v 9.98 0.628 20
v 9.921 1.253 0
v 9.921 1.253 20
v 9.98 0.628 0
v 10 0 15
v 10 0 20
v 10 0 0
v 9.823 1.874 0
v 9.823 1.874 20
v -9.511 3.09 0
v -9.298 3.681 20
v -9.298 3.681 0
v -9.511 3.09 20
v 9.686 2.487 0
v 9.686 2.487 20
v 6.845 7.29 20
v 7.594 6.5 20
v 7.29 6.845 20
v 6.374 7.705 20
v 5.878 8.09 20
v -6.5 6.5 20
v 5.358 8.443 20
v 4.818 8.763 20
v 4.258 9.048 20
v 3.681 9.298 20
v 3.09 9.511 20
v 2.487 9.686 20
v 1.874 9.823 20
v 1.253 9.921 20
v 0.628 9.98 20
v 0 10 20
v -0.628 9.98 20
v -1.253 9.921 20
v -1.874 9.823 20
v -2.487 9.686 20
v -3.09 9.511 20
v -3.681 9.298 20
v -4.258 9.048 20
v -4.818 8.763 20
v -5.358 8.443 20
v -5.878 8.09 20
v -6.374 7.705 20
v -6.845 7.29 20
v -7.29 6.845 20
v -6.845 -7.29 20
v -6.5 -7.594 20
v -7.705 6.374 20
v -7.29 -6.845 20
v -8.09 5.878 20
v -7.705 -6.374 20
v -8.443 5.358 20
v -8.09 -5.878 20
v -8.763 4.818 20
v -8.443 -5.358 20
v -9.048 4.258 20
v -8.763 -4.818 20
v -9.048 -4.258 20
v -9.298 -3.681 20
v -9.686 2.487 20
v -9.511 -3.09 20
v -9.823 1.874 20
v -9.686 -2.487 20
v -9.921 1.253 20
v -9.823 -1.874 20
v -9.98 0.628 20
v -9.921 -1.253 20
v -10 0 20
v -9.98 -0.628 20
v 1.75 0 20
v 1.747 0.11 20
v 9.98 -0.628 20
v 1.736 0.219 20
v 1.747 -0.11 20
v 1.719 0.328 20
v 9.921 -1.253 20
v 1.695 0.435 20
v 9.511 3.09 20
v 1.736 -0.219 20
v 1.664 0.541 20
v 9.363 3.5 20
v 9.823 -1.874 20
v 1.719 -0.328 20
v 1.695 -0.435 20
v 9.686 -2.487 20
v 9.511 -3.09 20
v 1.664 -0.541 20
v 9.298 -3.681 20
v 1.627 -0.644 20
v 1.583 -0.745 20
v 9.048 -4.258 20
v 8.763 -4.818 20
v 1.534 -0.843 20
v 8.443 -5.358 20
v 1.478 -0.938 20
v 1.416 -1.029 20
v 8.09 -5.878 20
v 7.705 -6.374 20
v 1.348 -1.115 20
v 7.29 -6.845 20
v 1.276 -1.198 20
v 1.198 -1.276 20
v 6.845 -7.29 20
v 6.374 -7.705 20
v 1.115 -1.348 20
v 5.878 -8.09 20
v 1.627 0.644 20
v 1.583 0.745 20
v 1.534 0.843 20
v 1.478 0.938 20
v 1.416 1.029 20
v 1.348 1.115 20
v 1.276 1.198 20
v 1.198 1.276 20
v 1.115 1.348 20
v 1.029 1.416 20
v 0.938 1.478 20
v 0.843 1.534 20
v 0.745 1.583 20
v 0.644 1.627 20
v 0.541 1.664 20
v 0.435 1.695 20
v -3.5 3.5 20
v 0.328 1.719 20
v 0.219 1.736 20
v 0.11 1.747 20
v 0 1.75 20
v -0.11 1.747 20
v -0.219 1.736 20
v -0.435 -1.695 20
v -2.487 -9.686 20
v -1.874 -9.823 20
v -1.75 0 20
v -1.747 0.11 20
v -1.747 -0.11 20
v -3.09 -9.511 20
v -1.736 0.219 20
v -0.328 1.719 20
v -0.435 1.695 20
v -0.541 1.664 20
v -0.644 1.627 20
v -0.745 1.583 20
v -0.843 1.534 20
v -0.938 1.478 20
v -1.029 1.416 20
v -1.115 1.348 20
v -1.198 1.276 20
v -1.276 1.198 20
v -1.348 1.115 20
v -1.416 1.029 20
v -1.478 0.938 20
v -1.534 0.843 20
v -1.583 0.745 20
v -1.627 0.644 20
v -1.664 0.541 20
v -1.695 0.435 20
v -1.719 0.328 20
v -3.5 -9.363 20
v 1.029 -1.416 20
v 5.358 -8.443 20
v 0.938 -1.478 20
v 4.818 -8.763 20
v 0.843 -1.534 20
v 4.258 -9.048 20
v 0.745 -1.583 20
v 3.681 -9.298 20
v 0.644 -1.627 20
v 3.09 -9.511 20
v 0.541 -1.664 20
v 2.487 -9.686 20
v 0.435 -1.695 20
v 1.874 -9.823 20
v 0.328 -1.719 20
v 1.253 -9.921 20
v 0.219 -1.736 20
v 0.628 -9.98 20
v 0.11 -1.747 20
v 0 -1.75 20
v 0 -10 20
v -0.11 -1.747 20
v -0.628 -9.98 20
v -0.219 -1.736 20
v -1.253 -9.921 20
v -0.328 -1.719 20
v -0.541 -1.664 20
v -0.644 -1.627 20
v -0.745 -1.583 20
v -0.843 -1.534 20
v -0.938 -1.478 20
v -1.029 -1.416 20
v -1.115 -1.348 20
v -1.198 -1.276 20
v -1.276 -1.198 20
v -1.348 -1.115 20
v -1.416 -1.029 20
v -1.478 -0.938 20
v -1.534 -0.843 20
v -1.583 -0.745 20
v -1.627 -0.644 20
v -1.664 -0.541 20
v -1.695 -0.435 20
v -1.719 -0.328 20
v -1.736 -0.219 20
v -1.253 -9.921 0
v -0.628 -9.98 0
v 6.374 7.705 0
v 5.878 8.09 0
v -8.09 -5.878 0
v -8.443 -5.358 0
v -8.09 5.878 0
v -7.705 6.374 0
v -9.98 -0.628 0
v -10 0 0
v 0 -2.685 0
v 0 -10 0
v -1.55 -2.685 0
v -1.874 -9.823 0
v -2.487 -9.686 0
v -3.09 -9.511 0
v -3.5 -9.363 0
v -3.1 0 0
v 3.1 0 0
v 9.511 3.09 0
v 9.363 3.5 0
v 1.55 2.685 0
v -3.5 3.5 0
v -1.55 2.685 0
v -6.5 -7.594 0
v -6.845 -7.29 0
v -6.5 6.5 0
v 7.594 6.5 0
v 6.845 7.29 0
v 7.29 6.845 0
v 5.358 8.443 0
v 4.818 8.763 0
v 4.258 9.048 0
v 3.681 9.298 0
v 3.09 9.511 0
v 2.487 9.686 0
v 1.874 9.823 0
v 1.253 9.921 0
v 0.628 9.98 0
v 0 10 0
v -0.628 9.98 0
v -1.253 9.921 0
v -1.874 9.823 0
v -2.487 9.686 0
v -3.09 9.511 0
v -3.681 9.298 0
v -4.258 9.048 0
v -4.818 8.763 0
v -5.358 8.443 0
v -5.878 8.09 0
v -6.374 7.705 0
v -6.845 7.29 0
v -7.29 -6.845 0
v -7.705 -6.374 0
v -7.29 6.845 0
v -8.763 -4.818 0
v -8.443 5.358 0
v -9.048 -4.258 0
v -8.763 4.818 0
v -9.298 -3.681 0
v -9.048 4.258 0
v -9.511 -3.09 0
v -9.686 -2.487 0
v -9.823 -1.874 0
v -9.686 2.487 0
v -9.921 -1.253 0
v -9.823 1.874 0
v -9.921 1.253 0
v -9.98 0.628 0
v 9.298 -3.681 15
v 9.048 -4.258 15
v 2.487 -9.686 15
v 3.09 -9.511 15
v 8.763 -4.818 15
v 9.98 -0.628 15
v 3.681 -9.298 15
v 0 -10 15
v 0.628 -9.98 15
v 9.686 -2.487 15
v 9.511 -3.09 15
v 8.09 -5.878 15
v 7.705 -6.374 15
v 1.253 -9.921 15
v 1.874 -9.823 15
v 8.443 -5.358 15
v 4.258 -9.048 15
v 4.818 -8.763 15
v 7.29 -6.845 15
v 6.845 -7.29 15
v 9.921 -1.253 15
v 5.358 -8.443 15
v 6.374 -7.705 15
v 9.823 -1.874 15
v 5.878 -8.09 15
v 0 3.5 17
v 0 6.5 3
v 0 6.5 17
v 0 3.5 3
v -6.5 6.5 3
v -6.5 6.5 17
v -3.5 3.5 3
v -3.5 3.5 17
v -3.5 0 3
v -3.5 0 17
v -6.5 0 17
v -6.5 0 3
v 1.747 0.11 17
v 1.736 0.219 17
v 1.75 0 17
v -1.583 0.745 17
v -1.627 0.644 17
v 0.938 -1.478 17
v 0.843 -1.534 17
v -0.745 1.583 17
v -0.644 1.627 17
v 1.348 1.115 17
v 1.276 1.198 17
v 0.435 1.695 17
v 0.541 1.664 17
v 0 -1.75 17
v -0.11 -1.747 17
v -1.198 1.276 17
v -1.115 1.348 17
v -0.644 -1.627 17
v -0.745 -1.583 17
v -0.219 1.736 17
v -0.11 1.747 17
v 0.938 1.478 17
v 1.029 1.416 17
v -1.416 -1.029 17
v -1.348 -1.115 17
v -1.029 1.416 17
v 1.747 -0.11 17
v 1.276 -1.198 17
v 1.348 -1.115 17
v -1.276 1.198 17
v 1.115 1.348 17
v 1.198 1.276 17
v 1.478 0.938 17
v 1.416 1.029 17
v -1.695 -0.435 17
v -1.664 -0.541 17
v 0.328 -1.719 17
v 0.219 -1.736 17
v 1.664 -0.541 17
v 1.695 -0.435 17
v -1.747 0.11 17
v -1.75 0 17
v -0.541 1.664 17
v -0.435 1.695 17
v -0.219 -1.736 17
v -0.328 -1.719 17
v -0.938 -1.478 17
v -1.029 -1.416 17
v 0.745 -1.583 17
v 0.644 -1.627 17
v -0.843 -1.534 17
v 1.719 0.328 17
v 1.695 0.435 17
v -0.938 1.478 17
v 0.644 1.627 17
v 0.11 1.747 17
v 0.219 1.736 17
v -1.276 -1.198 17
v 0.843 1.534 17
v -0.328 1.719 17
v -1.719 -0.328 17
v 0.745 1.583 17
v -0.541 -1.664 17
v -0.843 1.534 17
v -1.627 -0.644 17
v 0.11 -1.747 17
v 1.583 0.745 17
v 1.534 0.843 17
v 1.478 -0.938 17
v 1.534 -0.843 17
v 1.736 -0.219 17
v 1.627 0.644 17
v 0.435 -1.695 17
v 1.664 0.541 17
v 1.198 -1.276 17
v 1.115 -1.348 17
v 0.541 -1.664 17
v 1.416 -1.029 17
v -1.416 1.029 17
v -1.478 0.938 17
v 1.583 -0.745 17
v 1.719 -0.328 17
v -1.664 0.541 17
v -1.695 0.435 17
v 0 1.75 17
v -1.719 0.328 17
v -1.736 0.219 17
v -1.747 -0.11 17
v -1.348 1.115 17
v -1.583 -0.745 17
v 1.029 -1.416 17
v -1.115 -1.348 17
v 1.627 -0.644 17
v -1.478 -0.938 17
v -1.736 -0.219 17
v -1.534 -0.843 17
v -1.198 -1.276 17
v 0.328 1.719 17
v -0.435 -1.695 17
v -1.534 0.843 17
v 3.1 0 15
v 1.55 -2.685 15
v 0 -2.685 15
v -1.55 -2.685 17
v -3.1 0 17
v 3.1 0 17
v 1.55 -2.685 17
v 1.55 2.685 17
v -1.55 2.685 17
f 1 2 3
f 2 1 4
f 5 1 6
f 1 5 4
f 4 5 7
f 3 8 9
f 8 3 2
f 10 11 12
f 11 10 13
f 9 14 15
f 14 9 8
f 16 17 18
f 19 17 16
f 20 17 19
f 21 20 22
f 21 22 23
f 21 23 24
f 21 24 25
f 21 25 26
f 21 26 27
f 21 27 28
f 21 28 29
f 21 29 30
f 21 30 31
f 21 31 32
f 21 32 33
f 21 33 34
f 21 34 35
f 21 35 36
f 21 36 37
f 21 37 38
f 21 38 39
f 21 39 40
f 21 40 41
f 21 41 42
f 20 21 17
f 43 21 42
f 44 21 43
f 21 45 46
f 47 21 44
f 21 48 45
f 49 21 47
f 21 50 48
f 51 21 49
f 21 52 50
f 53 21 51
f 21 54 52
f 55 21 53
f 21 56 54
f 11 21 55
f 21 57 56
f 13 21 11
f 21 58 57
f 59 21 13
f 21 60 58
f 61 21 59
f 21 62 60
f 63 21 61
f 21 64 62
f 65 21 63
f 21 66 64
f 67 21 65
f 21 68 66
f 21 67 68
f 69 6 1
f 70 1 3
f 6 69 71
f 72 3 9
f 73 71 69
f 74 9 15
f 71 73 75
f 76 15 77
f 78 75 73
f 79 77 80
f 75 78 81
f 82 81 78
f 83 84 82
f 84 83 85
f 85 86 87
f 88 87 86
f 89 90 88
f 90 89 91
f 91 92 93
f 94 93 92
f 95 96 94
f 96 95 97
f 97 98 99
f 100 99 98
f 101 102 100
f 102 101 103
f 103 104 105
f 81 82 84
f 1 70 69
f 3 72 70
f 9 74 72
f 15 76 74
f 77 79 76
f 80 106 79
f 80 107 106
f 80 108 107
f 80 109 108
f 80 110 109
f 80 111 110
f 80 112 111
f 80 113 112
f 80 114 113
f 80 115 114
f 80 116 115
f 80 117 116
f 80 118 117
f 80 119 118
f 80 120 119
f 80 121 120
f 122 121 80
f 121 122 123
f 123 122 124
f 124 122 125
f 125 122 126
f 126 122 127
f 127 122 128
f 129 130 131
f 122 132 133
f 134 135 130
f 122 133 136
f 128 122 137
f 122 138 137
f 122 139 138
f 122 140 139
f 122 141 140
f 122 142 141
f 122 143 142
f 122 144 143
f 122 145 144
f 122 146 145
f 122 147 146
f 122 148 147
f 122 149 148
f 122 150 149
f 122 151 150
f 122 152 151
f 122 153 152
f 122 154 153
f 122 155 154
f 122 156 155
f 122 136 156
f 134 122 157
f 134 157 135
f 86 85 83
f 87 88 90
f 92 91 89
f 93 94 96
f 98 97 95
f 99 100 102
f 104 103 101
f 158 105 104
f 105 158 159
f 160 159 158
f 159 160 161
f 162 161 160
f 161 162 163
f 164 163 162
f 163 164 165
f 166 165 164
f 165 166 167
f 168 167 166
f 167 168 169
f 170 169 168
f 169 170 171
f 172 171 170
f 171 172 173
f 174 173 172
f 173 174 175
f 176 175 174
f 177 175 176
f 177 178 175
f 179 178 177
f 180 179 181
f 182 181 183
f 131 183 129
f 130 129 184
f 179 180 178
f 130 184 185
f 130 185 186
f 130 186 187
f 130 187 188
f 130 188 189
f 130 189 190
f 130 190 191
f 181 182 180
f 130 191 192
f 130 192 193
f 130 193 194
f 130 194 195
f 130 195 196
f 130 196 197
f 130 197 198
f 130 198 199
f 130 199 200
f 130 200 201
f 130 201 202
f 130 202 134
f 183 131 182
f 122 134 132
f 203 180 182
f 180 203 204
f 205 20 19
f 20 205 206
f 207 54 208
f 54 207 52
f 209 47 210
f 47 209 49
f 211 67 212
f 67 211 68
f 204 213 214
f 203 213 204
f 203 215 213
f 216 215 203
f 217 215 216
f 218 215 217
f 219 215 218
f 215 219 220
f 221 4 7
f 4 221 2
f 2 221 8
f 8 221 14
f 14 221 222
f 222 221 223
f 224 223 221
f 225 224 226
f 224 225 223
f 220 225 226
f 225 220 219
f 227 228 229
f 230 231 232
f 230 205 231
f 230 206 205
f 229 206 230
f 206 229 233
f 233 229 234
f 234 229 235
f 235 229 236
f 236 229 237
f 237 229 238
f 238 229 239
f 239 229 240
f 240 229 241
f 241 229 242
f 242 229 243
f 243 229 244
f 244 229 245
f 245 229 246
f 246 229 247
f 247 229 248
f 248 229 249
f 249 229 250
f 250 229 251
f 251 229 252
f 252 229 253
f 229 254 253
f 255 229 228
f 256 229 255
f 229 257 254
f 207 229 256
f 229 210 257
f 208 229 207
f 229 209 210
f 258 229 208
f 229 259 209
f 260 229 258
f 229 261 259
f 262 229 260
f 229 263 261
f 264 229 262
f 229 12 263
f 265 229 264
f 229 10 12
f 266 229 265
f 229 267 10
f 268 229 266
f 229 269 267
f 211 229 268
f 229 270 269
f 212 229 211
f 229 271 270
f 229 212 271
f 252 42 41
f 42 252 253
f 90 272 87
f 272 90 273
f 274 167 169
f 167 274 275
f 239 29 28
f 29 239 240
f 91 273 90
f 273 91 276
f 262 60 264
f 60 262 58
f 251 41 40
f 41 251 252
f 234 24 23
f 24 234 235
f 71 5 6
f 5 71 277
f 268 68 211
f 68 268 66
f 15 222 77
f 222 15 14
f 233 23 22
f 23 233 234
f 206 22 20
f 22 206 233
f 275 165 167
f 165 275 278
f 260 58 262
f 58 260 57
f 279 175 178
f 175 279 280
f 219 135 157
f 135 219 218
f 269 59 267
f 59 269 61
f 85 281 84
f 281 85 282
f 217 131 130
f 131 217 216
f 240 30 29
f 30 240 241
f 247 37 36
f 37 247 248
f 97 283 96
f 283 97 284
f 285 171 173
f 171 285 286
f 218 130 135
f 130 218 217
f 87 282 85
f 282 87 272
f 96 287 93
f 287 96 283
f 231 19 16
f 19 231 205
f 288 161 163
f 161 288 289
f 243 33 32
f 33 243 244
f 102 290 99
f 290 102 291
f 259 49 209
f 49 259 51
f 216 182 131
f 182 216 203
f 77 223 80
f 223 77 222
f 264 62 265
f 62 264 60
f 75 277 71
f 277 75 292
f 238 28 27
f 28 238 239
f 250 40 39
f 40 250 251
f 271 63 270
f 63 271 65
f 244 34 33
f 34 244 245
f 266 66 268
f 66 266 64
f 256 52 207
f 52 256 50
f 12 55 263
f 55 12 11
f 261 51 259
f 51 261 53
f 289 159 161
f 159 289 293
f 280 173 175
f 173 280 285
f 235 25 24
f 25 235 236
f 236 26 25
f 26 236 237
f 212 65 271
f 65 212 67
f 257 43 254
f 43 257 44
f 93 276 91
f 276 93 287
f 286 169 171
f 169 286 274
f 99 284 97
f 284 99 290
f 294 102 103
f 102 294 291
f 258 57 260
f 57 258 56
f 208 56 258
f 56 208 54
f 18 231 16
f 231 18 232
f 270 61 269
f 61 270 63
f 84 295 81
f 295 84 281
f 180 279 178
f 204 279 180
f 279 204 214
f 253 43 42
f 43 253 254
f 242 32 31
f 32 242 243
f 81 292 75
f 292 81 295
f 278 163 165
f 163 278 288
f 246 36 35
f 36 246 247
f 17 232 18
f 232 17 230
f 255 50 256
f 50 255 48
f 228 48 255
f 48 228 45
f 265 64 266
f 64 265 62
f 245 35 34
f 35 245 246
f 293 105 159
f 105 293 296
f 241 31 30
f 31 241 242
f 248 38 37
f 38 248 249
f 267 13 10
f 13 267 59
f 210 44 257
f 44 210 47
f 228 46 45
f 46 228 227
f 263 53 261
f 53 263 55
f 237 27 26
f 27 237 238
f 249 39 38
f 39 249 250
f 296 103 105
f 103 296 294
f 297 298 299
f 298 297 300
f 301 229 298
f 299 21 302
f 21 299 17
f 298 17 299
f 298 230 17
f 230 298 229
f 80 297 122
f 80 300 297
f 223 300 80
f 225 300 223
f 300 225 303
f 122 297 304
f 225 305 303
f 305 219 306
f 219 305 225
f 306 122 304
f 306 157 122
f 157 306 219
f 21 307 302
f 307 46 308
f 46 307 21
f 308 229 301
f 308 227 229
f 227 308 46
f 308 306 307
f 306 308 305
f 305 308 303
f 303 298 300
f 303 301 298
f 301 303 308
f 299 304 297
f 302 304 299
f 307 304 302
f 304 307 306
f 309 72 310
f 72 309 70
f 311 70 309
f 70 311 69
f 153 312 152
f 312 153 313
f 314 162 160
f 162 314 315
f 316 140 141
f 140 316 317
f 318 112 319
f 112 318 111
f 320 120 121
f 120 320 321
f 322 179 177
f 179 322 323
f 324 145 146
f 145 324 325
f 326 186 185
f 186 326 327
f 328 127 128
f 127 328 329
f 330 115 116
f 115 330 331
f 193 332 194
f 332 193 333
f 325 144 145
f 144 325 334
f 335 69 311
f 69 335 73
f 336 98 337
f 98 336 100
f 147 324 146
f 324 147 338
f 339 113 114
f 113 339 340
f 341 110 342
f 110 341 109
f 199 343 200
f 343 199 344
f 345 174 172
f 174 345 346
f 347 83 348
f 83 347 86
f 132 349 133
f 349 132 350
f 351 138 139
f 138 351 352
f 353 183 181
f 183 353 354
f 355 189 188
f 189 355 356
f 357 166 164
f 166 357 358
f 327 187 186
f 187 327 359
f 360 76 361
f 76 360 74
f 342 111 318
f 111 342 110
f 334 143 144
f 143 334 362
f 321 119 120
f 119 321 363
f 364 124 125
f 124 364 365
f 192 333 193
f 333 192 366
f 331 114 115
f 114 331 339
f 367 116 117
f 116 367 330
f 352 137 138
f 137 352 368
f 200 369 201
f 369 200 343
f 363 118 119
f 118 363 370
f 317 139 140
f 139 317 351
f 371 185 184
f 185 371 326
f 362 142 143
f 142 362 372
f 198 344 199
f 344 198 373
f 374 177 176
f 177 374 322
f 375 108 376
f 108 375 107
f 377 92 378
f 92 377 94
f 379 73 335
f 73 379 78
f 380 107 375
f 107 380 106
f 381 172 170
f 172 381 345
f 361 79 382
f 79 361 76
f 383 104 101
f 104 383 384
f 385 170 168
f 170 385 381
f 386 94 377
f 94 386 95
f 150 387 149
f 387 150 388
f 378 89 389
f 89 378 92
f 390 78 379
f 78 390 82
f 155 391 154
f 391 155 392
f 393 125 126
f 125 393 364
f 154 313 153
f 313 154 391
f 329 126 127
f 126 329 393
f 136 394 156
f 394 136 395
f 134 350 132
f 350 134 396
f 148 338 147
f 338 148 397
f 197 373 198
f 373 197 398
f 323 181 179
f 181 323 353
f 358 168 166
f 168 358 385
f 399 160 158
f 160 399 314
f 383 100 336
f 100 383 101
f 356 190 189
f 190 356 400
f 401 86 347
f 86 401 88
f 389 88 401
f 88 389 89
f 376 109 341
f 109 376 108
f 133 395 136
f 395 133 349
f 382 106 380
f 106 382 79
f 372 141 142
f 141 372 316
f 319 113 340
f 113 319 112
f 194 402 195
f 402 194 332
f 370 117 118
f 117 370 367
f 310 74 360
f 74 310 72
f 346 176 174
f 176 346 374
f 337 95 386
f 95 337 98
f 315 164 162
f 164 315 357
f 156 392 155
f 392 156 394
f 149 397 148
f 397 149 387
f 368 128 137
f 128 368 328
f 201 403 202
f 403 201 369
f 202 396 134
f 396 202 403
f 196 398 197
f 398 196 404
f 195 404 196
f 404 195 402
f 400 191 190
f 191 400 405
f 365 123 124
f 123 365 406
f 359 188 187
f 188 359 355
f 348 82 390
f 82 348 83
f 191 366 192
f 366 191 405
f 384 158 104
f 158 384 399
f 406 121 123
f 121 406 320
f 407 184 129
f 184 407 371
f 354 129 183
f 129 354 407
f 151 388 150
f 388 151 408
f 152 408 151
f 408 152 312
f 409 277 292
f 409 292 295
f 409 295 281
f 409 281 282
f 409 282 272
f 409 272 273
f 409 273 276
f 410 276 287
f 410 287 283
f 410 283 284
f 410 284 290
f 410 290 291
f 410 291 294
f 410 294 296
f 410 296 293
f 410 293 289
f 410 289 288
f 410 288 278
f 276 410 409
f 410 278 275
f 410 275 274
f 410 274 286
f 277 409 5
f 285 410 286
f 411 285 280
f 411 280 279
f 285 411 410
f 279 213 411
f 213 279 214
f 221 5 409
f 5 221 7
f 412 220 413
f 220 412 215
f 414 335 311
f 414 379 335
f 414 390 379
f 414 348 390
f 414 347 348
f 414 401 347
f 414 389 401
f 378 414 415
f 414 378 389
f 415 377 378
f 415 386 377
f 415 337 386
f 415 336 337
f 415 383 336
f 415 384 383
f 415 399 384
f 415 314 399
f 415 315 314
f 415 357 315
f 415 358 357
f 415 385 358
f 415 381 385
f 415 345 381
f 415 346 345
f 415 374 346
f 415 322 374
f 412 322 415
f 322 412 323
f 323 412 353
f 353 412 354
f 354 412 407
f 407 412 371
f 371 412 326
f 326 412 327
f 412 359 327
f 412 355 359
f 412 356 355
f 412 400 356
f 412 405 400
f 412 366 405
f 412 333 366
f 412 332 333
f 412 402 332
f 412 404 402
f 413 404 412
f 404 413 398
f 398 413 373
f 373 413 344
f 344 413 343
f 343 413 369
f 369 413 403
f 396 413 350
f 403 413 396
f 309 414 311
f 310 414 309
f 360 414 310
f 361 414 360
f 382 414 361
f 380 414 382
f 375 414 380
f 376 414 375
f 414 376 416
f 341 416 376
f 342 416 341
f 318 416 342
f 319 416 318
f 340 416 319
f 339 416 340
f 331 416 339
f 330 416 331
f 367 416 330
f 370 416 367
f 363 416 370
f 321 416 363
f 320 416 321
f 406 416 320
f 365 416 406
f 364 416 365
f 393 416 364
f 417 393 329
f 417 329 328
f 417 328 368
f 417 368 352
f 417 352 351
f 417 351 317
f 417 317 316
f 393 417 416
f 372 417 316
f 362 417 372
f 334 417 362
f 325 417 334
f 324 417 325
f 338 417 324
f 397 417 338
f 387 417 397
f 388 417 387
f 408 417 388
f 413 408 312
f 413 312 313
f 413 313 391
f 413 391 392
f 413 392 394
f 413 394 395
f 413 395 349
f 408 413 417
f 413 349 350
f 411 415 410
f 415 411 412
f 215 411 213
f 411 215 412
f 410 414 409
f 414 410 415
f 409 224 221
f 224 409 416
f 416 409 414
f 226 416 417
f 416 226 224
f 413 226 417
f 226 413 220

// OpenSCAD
// file: lada.scad
$fn=100;

mm = 1;
inch = 25.4 * mm;

LENGTH = .75 * inch;
EDGE_WIDTH = .5 * inch;
THICKNESS = .2 * inch;

MATERIAL_THICKNESS = 3 * mm;
OFFSET = .4 * inch;

HEX_R = 6.2 * mm / 2;
HEX_r = 5.6 * mm / 2;
HEX_THICKNESS = 2.3 * mm; 

PCB_L = 5 * inch;
PCB_W = 5 * inch;
PCB_H = 2 * mm;

//HEX_THICKNESS = 1.5 * mm; // for thin version
//THICKNESS = 3 * mm; // for thin version

SCREW_R = 1.6 * mm;
module hex(){
  linear_extrude(height=HEX_THICKNESS * 2, center=false) circle(r=HEX_R, $fn=6);
}
module hex_old(){
  difference(){
    cylinder(r=HEX_R, h=HEX_THICKNESS);
    for(i=[0, 1, 2, 3, 4, 5]){
      rotate(a=60 * i, v=[0, 0, 1])
	translate([HEX_r, -5, 5])rotate(a=90, v=[0, 1, 0])cube([10, 10, HEX_THICKNESS]);
    }
  }
}

TAB_HEIGHT = .5*mm;
TAB_R = 5*mm;
// tab to prevent rollup
module tab(x, y){
  translate([x, y])cylinder(r=TAB_R, h=TAB_HEIGHT);
}

module edge(length, thickness, offset){
  LENGTH = length;
  THICKNESS = thickness;
  OFFSET = offset;
  difference(){
    union(){
      difference(){
	cube([OFFSET, EDGE_WIDTH, OFFSET]);
	translate([THICKNESS, -.01 * EDGE_WIDTH/2, THICKNESS])scale([1, 1.01, 1])cube([LENGTH, EDGE_WIDTH, LENGTH]);
      }
      union(){
	translate([OFFSET, EDGE_WIDTH/2, 0])cylinder(r=EDGE_WIDTH / 2, h=THICKNESS);
	translate([0, EDGE_WIDTH/2, OFFSET])rotate(v=[0, 1, 0], a=90)cylinder(r=EDGE_WIDTH / 2, h=THICKNESS);
      }
    }
    translate([OFFSET, EDGE_WIDTH/2, 0])cylinder(r=SCREW_R, h=THICKNESS * 1.1);
    translate([-.01, EDGE_WIDTH/2, OFFSET])rotate(v=[0, 1, 0], a=90)cylinder(r=SCREW_R, h=THICKNESS * 10);
  }
}

module pcb(){
  cube([PCB_L, PCB_W, PCB_H]);
}

module inside_edge(length, thickness, offset){
  LENGTH = length;
  THICKNESS = thickness;
  OFFSET = offset;
  difference(){
    edge(length, thickness, offset);
    //translate([.2 * inch - 1*mm, EDGE_WIDTH/2 + PCB_H/2, .2 * inch - 1*mm])rotate(v=[-1, 0, 0], a=-90)translate([THICKNESS * 3/4, -1, THICKNESS])pcb();
    translate([OFFSET, EDGE_WIDTH/2, THICKNESS - HEX_THICKNESS])scale([1, 1, 1.01])hex();
    translate([THICKNESS - HEX_THICKNESS, EDGE_WIDTH/2, OFFSET])rotate(v=[0, 1, 0], a=90)scale([1, 1, 1.01])hex();
  }
}
module outside_edge(length, thickness, offset){
  difference(){
    edge(length, thickness, offset);
    translate([OFFSET, EDGE_WIDTH/2, 0])scale([1, 1, 1.01])cylinder(r=HEX_R * 1.1, h=HEX_THICKNESS);
    translate([0, EDGE_WIDTH/2, OFFSET])scale([1, 1, 1.01])rotate(v=[0, 1, 0], a=90)cylinder(r=HEX_R * 1.1, h=HEX_THICKNESS);
  }
}

module corner(length, thickness, offset){
  echo("offset", offset);
  LENGTH = length;
  THICKNESS = thickness;
  OFFSET = offset;
  union(){
    //tab(0, 0);
    //tab(LENGTH, 0);
    //tab(0, LENGTH);

    intersection(){
      difference(){
	cube(LENGTH);
	translate([THICKNESS, THICKNESS, THICKNESS])
	  cube(LENGTH);
	translate([OFFSET, OFFSET, 0])
	  translate([0, 0, -1])
	  cylinder(r=SCREW_R, h=2 * THICKNESS);
	translate([OFFSET, 0, OFFSET])
	  rotate(v=[-1, 0, 0], a=90) 
	  translate([0, 0, -1])
	  cylinder(r=SCREW_R, h=2 * THICKNESS);
	translate([0, OFFSET, OFFSET])
	  rotate(v=[0, 1, 0], a=90)
	  translate([0, 0, -1])
	  cylinder(r=SCREW_R, h=2 * THICKNESS);
      }
      
      union(){
	rotate(v=[0, 0, -1], a=0)cylinder(r=LENGTH*1.04, h=THICKNESS);
	rotate(v=[-1,0, 0], a=90)cylinder(r=LENGTH*1.04, h=THICKNESS);
	rotate(v=[0, 1, 0], a=90)cylinder(r=LENGTH*1.04 , h=THICKNESS);
      }
      // sphere(r=LENGTH);
    }
  }
}

module inside_corner(length, thickness, offset, standoff_h=10*mm){
  LENGTH = length;
  THICKNESS = thickness;
  OFFSET = offset;

  // translate([THICKNESS, THICKNESS, THICKNESS])cube(standoff_h*mm);
  difference(){
    corner(LENGTH, THICKNESS, OFFSET);
    translate([OFFSET, OFFSET, THICKNESS - HEX_THICKNESS])scale([1, 1, 100])hex();
    translate([OFFSET, THICKNESS - HEX_THICKNESS,  OFFSET])
      rotate(v=[-1, 0, 0], a=90)
      scale([1, 1, 100])
      hex();
    translate([THICKNESS - HEX_THICKNESS, OFFSET,  OFFSET])
      rotate(v=[1, 0, 0], a=30) // correct one!
      rotate(v=[0, 1, 0], a=90) // correct one!
      scale([1, 1, 100]) hex();
    // translate([THICKNESS * 2/4, THICKNESS * 2/4, THICKNESS + standoff_h])pcb();
  }
}
module outside_corner(length, thickness, offset, material_thickness){
  LENGTH = length + (material_thickness + thickness) * sqrt(2);
  THICKNESS = thickness;
  OFFSET = offset + material_thickness + thickness;
  echo("OFFSET", OFFSET);
  difference(){
    union(){
      corner(LENGTH, THICKNESS, OFFSET);
    }

    // counter bore
    translate([OFFSET,  HEX_THICKNESS, OFFSET])
      rotate(v=[1, 0, 0], a=90)
      rotate(v=[0, 0, 1], a=180)
      scale([1, 1, 100])
      cylinder(r=HEX_R * 1.1);
    translate([HEX_THICKNESS, OFFSET, OFFSET])
      rotate(v=[0, -1, 0], a=90)
      scale([1, 1, 100])
      cylinder(r=HEX_R * 1.1);
    translate([OFFSET,  OFFSET, HEX_THICKNESS, ])
      rotate(v=[0, 1, 0], a=180)
      scale([1, 1, 100])
      cylinder(r=HEX_R * 1.1);
  }
}
/* used for a specialized screen holder for photo booth */
module screen_clip(span, screen_h, overhang){
  difference(){
    union(){
      edge(LENGTH, THICKNESS, OFFSET);
      translate([OFFSET, 0, 0])cube([span, EDGE_WIDTH, THICKNESS]);
      translate([OFFSET + span - THICKNESS, 0, 0])cube([THICKNESS, EDGE_WIDTH, screen_h + THICKNESS]);
      translate([OFFSET + span - THICKNESS, 0, screen_h])cube([overhang + THICKNESS, EDGE_WIDTH, THICKNESS]);
    }
    union(){
      translate([OFFSET, EDGE_WIDTH/2, THICKNESS - HEX_THICKNESS])scale([1, 1, 1.01])hex();
      translate([THICKNESS - HEX_THICKNESS, EDGE_WIDTH/2, OFFSET])rotate(v=[0, 1, 0], a=90)scale([1, 1, 1.01])hex();
      translate([OFFSET, EDGE_WIDTH/2, 0])cylinder(r=SCREW_R, h=THICKNESS * 1.1);
    }
  }
}

module double_corner(span){
  // for use when two individual corners will not fit.  Span is inside distance between opposite faces.
  intersection(){
    difference(){
      cube([LENGTH, LENGTH, span]);
      translate([THICKNESS, THICKNESS, THICKNESS])cube([LENGTH, LENGTH, span - 2 * THICKNESS]);
      translate([OFFSET, OFFSET, 0])
	translate([0, 0, -1])
	cylinder(r=SCREW_R, h=2 * THICKNESS + span);
      translate([OFFSET, 0, span/2])
	rotate(v=[-1, 0, 0], a=90) 
	translate([0, 0, -1])
	cylinder(r=SCREW_R, h=2 * THICKNESS);
      translate([0, OFFSET, span/2])
	rotate(v=[0, 1, 0], a=90)
	translate([0, 0, -1])
	cylinder(r=SCREW_R, h=2 * THICKNESS);
      translate([OFFSET, OFFSET, THICKNESS - HEX_THICKNESS])hex();
      translate([OFFSET, OFFSET, span - HEX_THICKNESS - THICKNESS])hex();
    translate([OFFSET, THICKNESS - HEX_THICKNESS,  span/2])
      rotate(v=[-1, 0, 0], a=90)
      scale([1, 1, 100])
      hex();
    translate([THICKNESS - HEX_THICKNESS, OFFSET,  span/2])
      rotate(v=[1, 0, 0], a=30) // correct one!
      rotate(v=[0, 1, 0], a=90) // correct one!
      scale([1, 1, 100]) hex();

    }
    cylinder(r=LENGTH, h=40 * mm);
  }
}
// double_corner(35*mm);
// translate([0, MATERIAL_THICKNESS + THICKNESS, MATERIAL_THICKNESS + THICKNESS])inside_corner(LENGTH, THICKNESS, OFFSET); // corner
// translate([-MATERIAL_THICKNESS - THICKNESS, 0, 0])
// outside_corner(LENGTH, THICKNESS, OFFSET, MATERIAL_THICKNESS);

// translate([0, -1*inch, 0])inside_corner(LENGTH, THICKNESS, OFFSET);
// translate([0, 1*inch + 13, 0])rotate(v=[0, 0, 1], a=-90)inside_corner(LENGTH, THICKNESS, OFFSET);
// inside_edge(LENGTH, THICKNESS, OFFSET);
// main file
include <lada.scad>

$fn=100;

mm = 1;
inch = 25.4 * mm;

R = 10 * mm;
H = 20 * mm;
L = 11 * inch;
W = 11 * inch;
wall_offset = 3.5*mm;

difference(){
  union(){
    difference(){
      cylinder(h=H, r=R);
      // translate([-5*mm, 5*mm-R, -1])cube([R, R, H + 2]);
    }
  }
  // slot
  translate([0, wall_offset, -1])cube([2*inch, 3*mm, H + 2]);
  translate([-3*mm - wall_offset, -2*inch, -1])cube([3*mm, 2*inch, H + 2]);

  // key top
  translate([-3*mm - wall_offset, wall_offset, -1])cube([2*inch, 3*mm, 3*mm + 1]);
  translate([-3*mm - wall_offset, -2*inch+6*mm, -1])cube([3*mm, 2*inch, 3*mm + 1]);

  // key bottom
  translate([-3*mm - wall_offset, wall_offset, H - 3 * mm])cube([2*inch, 3*mm, 3*mm + 1]);
  translate([-3*mm - wall_offset, -2*inch+6*mm, H - 3*mm])cube([3*mm, 2*inch, 3*mm + 1]);

  translate([0, 0, -1])cylinder(h=H+2, d=3.5*mm);
  translate([-0, -R, -5*mm])cube([R, R, H]);
  translate([0, 0, H-3])rotate(a=180, v=[0, 1, 0])scale([1, 1, 10])hex();
}
